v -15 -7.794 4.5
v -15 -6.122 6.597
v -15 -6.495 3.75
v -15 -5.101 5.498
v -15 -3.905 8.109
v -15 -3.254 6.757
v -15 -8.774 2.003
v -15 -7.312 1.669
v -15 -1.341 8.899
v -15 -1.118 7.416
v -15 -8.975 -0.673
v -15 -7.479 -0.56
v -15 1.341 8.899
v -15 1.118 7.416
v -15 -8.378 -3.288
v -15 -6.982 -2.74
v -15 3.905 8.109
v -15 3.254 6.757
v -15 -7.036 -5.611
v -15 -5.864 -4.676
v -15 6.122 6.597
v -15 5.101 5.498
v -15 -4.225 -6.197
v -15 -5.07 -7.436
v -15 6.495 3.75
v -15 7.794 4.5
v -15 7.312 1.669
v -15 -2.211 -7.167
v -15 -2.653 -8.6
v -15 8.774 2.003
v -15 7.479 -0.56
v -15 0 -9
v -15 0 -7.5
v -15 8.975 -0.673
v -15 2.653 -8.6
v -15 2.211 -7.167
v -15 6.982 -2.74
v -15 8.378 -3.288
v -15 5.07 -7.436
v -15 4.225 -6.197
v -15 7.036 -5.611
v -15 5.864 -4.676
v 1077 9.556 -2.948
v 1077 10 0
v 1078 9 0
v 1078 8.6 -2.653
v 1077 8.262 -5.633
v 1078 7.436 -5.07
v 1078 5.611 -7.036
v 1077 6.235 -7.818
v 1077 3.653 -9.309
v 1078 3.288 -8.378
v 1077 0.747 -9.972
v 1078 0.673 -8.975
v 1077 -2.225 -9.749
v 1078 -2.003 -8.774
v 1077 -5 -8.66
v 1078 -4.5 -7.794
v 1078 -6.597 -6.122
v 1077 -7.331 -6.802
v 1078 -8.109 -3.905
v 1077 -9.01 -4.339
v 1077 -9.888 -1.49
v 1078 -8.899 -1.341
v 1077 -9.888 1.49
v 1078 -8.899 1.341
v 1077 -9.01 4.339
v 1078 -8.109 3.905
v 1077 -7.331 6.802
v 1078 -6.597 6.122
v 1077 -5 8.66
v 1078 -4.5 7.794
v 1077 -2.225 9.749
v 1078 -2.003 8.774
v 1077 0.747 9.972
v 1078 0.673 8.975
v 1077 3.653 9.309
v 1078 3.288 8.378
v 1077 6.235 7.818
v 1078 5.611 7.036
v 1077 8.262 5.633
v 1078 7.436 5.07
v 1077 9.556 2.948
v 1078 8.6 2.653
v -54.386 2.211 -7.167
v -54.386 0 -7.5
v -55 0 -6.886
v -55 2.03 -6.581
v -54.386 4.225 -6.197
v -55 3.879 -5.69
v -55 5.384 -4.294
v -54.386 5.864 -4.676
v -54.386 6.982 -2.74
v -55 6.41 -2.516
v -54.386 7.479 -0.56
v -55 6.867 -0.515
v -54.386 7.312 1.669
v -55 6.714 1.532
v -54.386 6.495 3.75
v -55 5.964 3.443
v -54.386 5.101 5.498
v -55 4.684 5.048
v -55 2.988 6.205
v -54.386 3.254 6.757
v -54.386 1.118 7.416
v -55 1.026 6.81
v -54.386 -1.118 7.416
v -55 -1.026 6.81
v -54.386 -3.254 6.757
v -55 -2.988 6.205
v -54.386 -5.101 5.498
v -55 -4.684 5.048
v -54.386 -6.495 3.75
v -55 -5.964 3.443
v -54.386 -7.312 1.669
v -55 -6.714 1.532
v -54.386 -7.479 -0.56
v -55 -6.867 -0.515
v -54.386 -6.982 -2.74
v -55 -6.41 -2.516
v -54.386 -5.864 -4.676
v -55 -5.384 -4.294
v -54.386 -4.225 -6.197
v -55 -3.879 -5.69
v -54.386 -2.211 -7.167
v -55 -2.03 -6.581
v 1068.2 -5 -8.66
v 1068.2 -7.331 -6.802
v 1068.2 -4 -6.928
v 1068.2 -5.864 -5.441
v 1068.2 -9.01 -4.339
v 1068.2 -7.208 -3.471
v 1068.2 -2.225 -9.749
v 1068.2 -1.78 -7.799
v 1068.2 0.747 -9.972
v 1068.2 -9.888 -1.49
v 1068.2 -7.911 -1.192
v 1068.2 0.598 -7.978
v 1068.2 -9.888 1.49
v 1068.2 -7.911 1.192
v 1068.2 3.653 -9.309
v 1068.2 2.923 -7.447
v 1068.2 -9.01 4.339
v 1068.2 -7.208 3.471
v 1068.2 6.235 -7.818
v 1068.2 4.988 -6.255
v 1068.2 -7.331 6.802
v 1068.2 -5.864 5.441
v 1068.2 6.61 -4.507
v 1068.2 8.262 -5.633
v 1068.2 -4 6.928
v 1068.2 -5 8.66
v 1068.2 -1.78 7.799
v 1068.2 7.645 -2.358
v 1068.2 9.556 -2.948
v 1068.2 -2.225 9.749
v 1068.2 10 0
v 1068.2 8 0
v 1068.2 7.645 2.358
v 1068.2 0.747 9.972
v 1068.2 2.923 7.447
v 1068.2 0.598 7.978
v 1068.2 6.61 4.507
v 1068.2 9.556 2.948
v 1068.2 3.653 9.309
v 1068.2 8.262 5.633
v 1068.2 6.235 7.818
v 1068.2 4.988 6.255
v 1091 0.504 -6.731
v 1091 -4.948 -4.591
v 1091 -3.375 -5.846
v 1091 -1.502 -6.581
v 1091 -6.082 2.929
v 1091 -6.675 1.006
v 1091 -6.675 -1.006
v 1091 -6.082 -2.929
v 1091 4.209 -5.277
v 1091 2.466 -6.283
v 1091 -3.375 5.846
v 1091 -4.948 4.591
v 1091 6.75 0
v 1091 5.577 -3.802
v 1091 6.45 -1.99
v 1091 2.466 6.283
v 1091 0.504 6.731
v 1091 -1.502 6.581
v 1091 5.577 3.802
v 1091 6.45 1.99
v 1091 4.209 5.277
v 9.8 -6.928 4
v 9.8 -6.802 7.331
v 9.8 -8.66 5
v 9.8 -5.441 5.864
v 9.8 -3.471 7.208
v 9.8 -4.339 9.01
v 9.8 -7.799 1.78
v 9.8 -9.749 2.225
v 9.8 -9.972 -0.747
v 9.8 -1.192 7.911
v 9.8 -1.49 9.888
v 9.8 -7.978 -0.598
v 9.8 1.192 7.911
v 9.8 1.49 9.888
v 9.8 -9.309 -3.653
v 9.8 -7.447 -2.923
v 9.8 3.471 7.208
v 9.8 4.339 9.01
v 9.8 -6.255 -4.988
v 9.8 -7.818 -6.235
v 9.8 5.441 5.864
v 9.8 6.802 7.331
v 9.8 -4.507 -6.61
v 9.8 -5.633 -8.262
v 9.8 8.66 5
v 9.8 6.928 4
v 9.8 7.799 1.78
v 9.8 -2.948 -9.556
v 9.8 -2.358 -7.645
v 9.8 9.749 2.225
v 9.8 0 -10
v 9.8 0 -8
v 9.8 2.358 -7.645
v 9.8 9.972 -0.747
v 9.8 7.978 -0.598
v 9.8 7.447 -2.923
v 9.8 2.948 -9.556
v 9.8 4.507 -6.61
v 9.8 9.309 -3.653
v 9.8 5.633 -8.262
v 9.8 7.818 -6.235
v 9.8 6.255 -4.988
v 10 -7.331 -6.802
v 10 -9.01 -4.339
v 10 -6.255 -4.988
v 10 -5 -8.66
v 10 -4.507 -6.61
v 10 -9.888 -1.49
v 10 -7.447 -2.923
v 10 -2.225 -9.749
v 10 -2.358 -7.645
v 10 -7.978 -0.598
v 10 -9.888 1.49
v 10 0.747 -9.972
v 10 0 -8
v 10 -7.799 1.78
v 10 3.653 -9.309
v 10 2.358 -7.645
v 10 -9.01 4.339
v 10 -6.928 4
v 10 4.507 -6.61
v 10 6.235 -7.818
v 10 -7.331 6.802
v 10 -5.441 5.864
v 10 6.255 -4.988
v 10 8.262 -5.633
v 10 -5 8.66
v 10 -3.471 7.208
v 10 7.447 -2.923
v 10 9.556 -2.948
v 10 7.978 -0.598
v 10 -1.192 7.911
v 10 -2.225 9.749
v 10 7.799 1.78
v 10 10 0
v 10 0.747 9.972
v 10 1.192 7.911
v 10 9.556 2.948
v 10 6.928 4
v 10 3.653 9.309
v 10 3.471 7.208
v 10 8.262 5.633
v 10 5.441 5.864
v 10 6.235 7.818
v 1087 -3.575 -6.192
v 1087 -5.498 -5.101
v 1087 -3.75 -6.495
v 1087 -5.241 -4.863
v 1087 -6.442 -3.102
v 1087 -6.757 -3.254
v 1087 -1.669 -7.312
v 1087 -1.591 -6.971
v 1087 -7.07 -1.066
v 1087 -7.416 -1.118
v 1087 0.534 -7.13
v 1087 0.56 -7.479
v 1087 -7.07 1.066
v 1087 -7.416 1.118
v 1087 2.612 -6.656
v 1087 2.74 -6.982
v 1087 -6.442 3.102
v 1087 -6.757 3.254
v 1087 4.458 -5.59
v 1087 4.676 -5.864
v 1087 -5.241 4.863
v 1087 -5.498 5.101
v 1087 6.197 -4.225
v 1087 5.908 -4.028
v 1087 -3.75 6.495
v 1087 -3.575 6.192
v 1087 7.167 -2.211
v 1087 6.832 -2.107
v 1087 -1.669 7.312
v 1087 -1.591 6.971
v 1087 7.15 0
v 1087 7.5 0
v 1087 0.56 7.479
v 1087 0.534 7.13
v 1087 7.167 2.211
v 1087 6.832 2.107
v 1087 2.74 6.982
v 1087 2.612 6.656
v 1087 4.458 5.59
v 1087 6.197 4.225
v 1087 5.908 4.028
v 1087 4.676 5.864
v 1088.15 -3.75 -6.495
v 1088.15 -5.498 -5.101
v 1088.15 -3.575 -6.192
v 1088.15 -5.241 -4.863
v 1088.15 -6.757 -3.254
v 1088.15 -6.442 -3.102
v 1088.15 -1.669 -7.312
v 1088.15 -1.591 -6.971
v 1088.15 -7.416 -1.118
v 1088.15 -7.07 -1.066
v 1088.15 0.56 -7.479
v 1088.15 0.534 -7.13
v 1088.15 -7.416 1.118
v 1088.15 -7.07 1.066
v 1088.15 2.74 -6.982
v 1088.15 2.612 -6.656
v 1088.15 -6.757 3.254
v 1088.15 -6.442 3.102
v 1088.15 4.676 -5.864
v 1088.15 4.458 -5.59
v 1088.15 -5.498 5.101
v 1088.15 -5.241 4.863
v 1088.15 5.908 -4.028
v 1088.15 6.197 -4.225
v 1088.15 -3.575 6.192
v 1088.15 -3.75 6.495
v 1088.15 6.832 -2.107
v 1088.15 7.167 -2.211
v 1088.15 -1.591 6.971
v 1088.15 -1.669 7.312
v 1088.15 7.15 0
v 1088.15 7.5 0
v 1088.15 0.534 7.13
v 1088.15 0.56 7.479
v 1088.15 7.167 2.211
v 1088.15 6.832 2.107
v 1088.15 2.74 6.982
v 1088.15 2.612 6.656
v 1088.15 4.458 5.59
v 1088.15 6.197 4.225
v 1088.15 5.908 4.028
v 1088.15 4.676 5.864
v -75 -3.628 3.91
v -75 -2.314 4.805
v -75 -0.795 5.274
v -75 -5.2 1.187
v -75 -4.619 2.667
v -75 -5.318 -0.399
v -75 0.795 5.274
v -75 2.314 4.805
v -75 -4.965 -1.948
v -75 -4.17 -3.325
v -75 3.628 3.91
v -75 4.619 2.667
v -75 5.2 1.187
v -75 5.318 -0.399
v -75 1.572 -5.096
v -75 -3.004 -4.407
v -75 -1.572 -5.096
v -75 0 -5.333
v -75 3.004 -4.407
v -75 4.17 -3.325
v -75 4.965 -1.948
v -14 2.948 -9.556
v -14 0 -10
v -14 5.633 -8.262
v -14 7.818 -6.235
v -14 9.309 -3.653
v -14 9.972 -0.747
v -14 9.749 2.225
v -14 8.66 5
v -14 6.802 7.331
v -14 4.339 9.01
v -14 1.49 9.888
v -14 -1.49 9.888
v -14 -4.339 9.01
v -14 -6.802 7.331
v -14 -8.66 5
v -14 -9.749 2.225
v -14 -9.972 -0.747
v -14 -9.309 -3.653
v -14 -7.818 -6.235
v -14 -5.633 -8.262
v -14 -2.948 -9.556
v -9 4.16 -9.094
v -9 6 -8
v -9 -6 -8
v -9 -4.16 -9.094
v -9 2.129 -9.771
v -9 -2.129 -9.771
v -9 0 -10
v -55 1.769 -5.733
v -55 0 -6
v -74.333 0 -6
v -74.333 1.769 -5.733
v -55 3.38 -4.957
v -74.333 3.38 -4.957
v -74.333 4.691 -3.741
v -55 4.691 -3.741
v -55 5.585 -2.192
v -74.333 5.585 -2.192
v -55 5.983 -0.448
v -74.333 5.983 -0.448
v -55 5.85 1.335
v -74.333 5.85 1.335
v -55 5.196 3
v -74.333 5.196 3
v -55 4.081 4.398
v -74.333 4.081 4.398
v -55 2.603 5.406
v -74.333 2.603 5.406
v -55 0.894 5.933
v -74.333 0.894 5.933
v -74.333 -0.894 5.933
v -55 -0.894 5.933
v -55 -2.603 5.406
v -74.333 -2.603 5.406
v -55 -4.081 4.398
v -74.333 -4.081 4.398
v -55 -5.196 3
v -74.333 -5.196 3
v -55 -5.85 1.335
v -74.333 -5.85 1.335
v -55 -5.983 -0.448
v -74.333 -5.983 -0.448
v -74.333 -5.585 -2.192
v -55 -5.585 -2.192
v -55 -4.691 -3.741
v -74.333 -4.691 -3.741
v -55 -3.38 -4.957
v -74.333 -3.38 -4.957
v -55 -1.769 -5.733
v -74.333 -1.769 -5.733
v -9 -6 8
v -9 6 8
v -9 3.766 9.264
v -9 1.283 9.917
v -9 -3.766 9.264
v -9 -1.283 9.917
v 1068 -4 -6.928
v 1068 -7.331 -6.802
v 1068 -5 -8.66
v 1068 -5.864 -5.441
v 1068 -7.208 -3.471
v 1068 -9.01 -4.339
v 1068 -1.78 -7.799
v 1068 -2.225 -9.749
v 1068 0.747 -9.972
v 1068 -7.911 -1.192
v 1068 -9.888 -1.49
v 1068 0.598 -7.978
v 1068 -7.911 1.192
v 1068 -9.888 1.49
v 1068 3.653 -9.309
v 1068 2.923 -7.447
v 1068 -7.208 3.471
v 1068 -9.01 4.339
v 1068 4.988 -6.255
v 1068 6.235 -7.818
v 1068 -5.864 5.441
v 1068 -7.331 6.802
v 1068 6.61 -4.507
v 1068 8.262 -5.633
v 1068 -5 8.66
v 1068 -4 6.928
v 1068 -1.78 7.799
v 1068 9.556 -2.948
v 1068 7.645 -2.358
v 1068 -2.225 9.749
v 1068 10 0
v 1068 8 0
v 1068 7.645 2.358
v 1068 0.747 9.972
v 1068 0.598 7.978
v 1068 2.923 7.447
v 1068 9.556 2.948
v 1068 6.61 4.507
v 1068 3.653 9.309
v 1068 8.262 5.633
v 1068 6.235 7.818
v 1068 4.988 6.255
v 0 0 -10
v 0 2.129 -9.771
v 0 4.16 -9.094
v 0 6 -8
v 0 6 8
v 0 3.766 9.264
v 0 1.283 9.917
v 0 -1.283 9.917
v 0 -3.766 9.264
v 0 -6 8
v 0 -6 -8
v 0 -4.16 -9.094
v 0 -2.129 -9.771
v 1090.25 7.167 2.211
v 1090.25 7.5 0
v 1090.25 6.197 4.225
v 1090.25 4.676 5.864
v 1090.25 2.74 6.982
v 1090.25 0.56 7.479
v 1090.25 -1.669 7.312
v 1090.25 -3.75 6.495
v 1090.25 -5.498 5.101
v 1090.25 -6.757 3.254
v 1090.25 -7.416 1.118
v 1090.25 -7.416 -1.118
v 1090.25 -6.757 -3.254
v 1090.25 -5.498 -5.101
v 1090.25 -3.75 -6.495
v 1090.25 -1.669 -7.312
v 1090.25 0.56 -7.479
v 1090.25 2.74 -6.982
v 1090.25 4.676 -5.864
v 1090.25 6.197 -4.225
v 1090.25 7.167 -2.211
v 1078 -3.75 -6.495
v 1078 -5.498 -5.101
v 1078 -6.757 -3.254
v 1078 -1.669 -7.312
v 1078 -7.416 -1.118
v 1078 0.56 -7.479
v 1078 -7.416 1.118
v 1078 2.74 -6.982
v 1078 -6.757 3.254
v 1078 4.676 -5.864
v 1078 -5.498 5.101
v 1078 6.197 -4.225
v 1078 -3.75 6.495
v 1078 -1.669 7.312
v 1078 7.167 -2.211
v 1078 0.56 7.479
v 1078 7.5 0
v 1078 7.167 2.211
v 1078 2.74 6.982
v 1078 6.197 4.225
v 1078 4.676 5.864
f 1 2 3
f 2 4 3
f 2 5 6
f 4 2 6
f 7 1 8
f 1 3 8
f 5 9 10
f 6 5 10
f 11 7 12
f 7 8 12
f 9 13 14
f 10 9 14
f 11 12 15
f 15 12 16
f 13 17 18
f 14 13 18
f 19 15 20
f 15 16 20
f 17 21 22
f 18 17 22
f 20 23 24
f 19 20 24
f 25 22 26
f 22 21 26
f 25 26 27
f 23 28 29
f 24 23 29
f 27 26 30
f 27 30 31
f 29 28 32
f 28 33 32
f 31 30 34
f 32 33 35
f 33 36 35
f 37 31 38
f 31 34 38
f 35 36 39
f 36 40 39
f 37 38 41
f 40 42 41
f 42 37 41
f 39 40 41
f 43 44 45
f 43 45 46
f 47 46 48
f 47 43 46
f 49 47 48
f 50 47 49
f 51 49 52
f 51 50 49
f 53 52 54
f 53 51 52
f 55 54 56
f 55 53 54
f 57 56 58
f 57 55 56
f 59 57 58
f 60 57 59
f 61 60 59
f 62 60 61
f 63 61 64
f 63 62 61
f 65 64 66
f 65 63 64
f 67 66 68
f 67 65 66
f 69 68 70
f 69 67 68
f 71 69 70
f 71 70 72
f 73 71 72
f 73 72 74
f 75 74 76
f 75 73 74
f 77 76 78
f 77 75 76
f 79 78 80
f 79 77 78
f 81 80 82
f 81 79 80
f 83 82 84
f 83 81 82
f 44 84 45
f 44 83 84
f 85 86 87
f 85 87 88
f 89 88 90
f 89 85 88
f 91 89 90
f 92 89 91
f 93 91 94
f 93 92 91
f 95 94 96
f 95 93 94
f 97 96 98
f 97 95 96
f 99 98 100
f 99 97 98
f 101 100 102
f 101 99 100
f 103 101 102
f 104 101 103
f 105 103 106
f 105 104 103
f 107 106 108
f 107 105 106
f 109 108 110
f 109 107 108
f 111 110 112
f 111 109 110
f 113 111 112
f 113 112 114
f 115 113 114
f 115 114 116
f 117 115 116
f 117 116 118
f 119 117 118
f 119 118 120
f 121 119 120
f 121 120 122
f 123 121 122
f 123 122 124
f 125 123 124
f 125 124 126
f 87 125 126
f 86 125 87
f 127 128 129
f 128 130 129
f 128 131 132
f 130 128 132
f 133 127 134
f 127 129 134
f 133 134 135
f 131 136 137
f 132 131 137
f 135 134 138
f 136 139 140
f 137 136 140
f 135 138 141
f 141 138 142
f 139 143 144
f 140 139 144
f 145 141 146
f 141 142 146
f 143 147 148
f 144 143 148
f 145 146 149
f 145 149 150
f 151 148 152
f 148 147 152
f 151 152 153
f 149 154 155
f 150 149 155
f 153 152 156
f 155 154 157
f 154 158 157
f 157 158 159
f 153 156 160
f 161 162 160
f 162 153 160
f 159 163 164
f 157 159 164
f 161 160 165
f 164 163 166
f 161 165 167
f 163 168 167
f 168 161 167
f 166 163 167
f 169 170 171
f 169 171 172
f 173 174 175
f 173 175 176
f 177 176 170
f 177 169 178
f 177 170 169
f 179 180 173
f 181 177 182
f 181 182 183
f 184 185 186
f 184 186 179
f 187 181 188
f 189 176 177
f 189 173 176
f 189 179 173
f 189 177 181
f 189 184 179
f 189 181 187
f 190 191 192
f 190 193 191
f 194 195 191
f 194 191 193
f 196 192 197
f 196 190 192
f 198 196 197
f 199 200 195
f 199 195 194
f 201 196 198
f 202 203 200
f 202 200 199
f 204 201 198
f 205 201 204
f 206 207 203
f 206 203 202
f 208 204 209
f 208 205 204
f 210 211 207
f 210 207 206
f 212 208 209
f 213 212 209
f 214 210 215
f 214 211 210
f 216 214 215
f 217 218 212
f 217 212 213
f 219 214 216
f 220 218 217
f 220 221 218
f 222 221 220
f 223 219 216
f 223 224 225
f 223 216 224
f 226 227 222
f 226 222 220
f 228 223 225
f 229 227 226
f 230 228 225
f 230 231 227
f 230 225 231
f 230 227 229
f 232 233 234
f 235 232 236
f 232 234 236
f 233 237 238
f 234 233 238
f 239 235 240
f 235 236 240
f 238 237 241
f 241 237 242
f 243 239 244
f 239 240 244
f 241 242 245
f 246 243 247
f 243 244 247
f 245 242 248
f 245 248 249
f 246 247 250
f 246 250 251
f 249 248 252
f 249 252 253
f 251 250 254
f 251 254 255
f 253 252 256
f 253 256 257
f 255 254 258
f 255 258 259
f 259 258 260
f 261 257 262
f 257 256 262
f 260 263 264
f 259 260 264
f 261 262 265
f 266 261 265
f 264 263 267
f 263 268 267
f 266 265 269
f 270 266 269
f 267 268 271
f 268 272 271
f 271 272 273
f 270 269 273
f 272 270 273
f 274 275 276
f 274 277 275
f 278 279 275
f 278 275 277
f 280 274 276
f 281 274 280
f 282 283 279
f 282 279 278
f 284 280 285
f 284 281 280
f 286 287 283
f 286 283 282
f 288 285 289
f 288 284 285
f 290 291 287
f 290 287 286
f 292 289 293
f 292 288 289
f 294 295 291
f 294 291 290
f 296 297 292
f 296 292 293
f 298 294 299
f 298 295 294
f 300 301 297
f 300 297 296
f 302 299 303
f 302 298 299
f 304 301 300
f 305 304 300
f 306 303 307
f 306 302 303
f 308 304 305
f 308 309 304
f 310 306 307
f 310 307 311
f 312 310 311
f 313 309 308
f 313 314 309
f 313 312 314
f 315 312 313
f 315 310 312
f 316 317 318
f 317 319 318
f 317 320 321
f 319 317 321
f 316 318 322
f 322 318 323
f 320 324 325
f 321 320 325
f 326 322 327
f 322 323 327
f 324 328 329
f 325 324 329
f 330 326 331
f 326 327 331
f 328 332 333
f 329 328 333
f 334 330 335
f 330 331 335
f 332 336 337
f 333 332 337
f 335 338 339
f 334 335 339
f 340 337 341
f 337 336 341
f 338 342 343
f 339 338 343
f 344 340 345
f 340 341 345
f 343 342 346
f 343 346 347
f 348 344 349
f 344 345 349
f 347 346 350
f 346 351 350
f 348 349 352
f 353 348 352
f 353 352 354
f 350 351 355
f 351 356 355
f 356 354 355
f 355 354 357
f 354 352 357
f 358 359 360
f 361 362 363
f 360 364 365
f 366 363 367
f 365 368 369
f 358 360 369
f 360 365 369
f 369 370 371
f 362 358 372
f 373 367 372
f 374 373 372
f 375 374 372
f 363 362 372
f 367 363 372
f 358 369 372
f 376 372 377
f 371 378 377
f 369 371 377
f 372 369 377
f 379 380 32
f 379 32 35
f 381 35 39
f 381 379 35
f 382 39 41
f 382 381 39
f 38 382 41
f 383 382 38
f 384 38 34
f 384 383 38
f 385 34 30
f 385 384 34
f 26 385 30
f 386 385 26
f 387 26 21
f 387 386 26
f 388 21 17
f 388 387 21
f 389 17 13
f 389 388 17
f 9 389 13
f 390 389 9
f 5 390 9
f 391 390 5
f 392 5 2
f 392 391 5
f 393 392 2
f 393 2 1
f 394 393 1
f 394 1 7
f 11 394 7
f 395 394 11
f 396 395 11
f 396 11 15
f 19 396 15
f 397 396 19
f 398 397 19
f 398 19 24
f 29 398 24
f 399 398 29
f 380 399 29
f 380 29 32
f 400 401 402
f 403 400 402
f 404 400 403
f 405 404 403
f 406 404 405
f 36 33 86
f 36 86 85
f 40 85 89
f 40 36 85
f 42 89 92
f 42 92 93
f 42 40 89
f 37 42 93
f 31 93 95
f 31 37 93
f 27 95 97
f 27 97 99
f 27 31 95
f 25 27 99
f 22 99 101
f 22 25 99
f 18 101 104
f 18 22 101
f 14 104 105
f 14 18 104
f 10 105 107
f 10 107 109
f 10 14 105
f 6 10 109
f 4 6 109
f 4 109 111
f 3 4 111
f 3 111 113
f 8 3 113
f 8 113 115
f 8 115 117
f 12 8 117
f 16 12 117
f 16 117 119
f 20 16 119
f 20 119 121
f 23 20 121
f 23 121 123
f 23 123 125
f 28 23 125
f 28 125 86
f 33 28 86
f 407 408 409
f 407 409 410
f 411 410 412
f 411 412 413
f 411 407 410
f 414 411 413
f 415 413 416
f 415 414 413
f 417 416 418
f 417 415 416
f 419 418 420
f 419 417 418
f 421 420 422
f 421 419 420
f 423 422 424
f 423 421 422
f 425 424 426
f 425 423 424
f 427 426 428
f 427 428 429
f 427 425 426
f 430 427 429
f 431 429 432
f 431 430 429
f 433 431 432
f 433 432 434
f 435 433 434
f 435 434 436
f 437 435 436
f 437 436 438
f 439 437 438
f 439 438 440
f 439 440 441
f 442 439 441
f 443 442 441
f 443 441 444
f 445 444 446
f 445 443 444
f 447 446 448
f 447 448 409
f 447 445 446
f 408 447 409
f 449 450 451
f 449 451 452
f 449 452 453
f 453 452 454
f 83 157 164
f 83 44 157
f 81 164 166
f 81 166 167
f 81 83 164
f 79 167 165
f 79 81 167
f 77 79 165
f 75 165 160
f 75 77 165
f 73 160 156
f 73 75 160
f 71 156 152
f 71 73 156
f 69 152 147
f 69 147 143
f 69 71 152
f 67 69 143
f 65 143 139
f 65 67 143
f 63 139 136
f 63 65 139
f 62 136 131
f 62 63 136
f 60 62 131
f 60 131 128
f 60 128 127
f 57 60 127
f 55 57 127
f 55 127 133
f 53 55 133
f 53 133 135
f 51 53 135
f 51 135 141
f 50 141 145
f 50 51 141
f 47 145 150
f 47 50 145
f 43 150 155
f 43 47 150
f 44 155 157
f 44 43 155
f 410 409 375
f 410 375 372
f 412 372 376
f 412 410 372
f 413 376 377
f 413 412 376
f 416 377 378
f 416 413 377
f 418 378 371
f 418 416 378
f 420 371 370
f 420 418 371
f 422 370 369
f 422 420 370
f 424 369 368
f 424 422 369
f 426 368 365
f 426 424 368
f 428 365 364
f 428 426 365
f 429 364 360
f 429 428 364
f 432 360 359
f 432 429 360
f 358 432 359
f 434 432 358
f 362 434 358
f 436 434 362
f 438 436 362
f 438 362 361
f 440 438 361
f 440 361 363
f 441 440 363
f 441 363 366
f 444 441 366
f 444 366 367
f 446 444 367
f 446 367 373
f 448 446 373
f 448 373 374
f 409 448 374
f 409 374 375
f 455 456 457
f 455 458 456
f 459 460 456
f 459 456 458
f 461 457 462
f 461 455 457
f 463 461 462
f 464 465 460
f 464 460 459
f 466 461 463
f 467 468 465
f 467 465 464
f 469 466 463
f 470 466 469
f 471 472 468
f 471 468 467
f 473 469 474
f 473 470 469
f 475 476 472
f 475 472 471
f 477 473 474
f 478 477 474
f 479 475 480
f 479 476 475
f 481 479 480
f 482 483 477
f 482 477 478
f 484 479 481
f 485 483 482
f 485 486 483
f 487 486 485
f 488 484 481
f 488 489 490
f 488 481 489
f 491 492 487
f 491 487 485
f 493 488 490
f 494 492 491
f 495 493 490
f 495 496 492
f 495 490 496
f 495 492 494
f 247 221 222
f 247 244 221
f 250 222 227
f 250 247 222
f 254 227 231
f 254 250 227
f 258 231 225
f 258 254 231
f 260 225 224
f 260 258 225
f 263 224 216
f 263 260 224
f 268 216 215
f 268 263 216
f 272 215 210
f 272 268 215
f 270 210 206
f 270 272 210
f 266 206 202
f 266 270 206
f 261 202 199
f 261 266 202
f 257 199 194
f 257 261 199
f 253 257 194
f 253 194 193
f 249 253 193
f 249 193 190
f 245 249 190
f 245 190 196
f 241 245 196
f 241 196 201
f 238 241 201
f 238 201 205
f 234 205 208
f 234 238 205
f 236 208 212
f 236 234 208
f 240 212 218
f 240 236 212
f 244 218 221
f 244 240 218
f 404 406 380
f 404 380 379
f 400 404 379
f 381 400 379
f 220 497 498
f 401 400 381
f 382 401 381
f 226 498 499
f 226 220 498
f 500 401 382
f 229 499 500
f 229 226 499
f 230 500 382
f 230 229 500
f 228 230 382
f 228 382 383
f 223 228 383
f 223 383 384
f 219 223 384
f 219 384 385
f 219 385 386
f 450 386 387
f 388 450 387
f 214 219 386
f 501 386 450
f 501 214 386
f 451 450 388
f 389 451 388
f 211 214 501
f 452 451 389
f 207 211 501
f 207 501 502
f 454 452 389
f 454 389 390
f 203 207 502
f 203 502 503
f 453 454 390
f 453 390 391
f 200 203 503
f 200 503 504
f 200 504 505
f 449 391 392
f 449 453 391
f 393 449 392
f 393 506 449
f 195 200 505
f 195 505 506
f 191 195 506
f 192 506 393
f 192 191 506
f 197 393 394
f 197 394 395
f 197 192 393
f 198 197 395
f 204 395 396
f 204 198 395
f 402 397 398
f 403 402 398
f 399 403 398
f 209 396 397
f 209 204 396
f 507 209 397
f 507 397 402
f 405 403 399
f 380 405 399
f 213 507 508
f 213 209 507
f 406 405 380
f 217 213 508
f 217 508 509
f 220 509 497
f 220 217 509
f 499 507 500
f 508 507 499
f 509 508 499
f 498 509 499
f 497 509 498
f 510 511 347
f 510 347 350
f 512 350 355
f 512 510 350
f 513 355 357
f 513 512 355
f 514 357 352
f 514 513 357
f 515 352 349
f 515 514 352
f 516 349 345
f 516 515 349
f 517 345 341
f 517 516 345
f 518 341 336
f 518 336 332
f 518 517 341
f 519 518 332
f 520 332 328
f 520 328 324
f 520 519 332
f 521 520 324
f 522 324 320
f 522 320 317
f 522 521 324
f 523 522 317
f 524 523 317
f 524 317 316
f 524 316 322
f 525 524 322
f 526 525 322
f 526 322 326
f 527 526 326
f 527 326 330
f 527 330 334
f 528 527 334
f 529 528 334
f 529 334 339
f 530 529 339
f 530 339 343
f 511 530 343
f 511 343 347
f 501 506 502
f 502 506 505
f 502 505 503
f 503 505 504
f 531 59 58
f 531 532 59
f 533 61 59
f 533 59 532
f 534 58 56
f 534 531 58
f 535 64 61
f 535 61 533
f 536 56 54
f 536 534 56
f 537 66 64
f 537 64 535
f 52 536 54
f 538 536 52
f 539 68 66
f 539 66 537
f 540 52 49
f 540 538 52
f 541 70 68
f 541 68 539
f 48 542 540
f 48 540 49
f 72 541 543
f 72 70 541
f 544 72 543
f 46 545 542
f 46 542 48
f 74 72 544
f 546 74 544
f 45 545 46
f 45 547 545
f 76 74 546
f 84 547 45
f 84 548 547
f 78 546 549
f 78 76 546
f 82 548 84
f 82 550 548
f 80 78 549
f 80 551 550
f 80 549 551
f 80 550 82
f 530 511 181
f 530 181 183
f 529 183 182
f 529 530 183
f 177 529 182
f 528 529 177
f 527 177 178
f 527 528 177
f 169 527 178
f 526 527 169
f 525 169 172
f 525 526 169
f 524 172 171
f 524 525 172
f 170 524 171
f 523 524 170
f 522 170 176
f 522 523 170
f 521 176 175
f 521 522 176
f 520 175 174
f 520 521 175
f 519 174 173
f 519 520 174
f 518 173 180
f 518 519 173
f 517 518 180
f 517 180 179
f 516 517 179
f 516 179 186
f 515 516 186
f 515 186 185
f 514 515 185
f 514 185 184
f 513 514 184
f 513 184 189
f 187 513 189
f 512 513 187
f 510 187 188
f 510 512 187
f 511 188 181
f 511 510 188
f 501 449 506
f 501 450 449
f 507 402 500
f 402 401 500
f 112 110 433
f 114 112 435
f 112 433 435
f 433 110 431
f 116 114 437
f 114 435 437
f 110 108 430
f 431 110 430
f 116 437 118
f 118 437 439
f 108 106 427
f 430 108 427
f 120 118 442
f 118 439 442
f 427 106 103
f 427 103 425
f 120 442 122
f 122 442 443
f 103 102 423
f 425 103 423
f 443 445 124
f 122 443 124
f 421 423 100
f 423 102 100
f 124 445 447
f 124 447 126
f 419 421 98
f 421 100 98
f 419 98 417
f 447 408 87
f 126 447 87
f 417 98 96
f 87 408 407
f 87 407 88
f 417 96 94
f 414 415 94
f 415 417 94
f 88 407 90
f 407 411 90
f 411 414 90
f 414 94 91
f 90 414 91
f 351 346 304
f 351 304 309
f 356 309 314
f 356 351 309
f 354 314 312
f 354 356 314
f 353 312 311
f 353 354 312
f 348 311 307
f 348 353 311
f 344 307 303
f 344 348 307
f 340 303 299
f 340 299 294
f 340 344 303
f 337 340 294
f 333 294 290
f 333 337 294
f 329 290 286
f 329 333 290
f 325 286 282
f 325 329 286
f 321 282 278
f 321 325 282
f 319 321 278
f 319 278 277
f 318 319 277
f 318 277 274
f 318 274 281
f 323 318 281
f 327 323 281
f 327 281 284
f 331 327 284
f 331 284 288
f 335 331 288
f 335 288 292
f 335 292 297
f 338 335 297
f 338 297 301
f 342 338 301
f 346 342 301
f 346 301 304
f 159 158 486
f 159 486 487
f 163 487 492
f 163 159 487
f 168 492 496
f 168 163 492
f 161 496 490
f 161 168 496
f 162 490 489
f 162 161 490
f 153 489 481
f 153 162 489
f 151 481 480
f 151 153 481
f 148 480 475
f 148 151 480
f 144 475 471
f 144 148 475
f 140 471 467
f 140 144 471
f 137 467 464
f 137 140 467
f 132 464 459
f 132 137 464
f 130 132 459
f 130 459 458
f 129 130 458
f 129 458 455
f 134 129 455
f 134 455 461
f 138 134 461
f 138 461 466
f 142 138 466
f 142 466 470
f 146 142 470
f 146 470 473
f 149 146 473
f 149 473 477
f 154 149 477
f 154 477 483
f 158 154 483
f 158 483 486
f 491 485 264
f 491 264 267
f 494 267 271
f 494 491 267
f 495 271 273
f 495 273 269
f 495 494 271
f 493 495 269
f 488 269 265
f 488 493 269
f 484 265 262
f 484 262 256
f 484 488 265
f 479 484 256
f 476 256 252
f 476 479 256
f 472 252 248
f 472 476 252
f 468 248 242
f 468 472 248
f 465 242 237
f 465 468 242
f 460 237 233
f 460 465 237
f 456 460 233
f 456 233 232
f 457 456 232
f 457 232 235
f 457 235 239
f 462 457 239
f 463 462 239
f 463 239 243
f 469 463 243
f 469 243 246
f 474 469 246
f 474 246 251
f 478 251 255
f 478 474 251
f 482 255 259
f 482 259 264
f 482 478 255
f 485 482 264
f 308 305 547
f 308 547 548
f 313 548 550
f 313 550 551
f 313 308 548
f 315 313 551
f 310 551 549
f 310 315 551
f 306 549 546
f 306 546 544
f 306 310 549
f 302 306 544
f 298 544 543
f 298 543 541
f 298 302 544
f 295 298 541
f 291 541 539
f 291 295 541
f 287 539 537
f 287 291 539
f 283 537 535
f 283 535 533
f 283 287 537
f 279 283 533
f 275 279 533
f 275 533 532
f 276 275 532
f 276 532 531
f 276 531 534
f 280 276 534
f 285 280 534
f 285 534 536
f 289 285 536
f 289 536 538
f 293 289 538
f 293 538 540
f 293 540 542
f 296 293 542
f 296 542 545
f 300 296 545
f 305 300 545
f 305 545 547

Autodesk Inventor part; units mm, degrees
sketch "Sketch_1" plane through (0, 0, 0) normal (0, 0, 1) x (1, 0, 0)
  line L0 (1068, 0) -> (10, 0)
  line L1 (10, 0) -> (10, 10)
  line L2 (10, 10) -> (1068, 10)
  line L3 (1068, 10) -> (1068, 0)
  line L4 (1068, 0) -> (10, 0)
revolve "Revolution1" add sketch "Sketch_1" angle 360 about axis through (1068, 0, 0) along (1, 0, 0)
thread "Thread1" size "M20x2.5" class "6g" standard "ISO Metric profile" full length
sketch "Sketch_10" plane through (0, 0, 0) normal (0, 1, 0) x (-1, 0, 0)
  line L0 (-10, 0) -> (75, 0)
  line L1 (75, 0) -> (75, -5.3333)
  line L2 (75, -5.3333) -> (74.3333, -6)
  line L3 (74.3333, -6) -> (55, -6)
  line L4 (55, -6) -> (55, -6.8865)
  line L5 (55, -6.8865) -> (54.3865, -7.5)
  line L6 (54.3865, -7.5) -> (15, -7.5)
  line L7 (15, -7.5) -> (15, -9)
  line L8 (15, -9) -> (14, -10)
  line L9 (14, -10) -> (-9.8, -10)
  line L10 (-9.8, -10) -> (-9.8, -8)
  line L11 (-9.8, -8) -> (-10, -8)
  line L12 (-10, -8) -> (-10, 0)
  line L13 (-10, 0) -> (75, 0)
revolve "Revolution2" add sketch "Sketch_10" angle 360 about axis through (10, 0, 0) along (1, 0, 0)
thread "Thread2" size "M15x1" class "6g" standard "ISO Metric profile" length 11.3865
sketch "Sketch_11" plane through (0, 0, 8) normal (0, 0, 1) x (1, 0, 0)
  line L0 (-9, -10) -> (0, -10)
  line L1 (0, -10) -> (0, 10)
  line L2 (0, 10) -> (-9, 10)
  line L3 (-9, 10) -> (-9, -10)
extrude "Extrusion1" cut sketch "Sketch_11" along normal blind 4
sketch "Sketch_12" plane through (0, 0, -8) normal (0, 0, 1) x (1, 0, 0)
  line L0 (-9, -10) -> (0, -10)
  line L1 (0, -10) -> (0, 10)
  line L2 (0, 10) -> (-9, 10)
  line L3 (-9, 10) -> (-9, -10)
extrude "Extrusion2" cut sketch "Sketch_12" against normal blind 4
sketch "Sketch_16" plane through (0, 0, 0) normal (0, 0, 1) x (1, 0, 0)
  line L0 (1091, 0) -> (1068, 0)
  line L1 (1068, 0) -> (1068, 8)
  line L2 (1068, 8) -> (1068.2, 8)
  line L3 (1068.2, 8) -> (1068.2, 10)
  line L4 (1068.2, 10) -> (1077, 10)
  line L5 (1077, 10) -> (1078, 9)
  line L6 (1078, 9) -> (1078, 7.5)
  line L7 (1078, 7.5) -> (1087, 7.5)
  line L8 (1087, 7.5) -> (1087, 7.15)
  line L9 (1087, 7.15) -> (1088.15, 7.15)
  line L10 (1088.15, 7.15) -> (1088.15, 7.5)
  line L11 (1088.15, 7.5) -> (1090.25, 7.5)
  line L12 (1090.25, 7.5) -> (1091, 6.75)
  line L13 (1091, 6.75) -> (1091, 0)
  line L14 (1091, 0) -> (1068, 0)
revolve "Revolution3" add sketch "Sketch_16" angle 360 about axis through (1091, 0, 0) along (1, 0, 0)
ref_plane "FSS_XY" through (-15, 0, 0) normal (1, 0, 0) x (0, 0, -1)
ref_plane "FSS_YZ" through (-15, 0, 0) normal (0, 0, -1) x (0, 1, 0)
ref_plane "FSS_ZX" through (-15, 0, 0) normal (0, 1, 0) x (1, 0, 0)
ref_plane "SSS_XY" through (1078, 0, 0) normal (1, 0, 0) x (0, 0, -1)
ref_plane "SSS_YZ" through (1078, 0, 0) normal (0, 0, -1) x (0, 1, 0)
ref_plane "SSS_ZX" through (1078, 0, 0) normal (0, 1, 0) x (1, 0, 0)
ref_plane "bnt_s_1_XY" through (0, 0, 0) normal (-1, 0, 0) x (0, 0, -1)
ref_plane "bnt_s_1_YZ" through (0, 0, 0) normal (0, 0, -1) x (0, -1, 0)
ref_plane "bnt_s_1_ZX" through (0, 0, 0) normal (0, -1, 0) x (-1, 0, 0)
properties part number "BNT 2010-2.61000-J1K Shaft"
